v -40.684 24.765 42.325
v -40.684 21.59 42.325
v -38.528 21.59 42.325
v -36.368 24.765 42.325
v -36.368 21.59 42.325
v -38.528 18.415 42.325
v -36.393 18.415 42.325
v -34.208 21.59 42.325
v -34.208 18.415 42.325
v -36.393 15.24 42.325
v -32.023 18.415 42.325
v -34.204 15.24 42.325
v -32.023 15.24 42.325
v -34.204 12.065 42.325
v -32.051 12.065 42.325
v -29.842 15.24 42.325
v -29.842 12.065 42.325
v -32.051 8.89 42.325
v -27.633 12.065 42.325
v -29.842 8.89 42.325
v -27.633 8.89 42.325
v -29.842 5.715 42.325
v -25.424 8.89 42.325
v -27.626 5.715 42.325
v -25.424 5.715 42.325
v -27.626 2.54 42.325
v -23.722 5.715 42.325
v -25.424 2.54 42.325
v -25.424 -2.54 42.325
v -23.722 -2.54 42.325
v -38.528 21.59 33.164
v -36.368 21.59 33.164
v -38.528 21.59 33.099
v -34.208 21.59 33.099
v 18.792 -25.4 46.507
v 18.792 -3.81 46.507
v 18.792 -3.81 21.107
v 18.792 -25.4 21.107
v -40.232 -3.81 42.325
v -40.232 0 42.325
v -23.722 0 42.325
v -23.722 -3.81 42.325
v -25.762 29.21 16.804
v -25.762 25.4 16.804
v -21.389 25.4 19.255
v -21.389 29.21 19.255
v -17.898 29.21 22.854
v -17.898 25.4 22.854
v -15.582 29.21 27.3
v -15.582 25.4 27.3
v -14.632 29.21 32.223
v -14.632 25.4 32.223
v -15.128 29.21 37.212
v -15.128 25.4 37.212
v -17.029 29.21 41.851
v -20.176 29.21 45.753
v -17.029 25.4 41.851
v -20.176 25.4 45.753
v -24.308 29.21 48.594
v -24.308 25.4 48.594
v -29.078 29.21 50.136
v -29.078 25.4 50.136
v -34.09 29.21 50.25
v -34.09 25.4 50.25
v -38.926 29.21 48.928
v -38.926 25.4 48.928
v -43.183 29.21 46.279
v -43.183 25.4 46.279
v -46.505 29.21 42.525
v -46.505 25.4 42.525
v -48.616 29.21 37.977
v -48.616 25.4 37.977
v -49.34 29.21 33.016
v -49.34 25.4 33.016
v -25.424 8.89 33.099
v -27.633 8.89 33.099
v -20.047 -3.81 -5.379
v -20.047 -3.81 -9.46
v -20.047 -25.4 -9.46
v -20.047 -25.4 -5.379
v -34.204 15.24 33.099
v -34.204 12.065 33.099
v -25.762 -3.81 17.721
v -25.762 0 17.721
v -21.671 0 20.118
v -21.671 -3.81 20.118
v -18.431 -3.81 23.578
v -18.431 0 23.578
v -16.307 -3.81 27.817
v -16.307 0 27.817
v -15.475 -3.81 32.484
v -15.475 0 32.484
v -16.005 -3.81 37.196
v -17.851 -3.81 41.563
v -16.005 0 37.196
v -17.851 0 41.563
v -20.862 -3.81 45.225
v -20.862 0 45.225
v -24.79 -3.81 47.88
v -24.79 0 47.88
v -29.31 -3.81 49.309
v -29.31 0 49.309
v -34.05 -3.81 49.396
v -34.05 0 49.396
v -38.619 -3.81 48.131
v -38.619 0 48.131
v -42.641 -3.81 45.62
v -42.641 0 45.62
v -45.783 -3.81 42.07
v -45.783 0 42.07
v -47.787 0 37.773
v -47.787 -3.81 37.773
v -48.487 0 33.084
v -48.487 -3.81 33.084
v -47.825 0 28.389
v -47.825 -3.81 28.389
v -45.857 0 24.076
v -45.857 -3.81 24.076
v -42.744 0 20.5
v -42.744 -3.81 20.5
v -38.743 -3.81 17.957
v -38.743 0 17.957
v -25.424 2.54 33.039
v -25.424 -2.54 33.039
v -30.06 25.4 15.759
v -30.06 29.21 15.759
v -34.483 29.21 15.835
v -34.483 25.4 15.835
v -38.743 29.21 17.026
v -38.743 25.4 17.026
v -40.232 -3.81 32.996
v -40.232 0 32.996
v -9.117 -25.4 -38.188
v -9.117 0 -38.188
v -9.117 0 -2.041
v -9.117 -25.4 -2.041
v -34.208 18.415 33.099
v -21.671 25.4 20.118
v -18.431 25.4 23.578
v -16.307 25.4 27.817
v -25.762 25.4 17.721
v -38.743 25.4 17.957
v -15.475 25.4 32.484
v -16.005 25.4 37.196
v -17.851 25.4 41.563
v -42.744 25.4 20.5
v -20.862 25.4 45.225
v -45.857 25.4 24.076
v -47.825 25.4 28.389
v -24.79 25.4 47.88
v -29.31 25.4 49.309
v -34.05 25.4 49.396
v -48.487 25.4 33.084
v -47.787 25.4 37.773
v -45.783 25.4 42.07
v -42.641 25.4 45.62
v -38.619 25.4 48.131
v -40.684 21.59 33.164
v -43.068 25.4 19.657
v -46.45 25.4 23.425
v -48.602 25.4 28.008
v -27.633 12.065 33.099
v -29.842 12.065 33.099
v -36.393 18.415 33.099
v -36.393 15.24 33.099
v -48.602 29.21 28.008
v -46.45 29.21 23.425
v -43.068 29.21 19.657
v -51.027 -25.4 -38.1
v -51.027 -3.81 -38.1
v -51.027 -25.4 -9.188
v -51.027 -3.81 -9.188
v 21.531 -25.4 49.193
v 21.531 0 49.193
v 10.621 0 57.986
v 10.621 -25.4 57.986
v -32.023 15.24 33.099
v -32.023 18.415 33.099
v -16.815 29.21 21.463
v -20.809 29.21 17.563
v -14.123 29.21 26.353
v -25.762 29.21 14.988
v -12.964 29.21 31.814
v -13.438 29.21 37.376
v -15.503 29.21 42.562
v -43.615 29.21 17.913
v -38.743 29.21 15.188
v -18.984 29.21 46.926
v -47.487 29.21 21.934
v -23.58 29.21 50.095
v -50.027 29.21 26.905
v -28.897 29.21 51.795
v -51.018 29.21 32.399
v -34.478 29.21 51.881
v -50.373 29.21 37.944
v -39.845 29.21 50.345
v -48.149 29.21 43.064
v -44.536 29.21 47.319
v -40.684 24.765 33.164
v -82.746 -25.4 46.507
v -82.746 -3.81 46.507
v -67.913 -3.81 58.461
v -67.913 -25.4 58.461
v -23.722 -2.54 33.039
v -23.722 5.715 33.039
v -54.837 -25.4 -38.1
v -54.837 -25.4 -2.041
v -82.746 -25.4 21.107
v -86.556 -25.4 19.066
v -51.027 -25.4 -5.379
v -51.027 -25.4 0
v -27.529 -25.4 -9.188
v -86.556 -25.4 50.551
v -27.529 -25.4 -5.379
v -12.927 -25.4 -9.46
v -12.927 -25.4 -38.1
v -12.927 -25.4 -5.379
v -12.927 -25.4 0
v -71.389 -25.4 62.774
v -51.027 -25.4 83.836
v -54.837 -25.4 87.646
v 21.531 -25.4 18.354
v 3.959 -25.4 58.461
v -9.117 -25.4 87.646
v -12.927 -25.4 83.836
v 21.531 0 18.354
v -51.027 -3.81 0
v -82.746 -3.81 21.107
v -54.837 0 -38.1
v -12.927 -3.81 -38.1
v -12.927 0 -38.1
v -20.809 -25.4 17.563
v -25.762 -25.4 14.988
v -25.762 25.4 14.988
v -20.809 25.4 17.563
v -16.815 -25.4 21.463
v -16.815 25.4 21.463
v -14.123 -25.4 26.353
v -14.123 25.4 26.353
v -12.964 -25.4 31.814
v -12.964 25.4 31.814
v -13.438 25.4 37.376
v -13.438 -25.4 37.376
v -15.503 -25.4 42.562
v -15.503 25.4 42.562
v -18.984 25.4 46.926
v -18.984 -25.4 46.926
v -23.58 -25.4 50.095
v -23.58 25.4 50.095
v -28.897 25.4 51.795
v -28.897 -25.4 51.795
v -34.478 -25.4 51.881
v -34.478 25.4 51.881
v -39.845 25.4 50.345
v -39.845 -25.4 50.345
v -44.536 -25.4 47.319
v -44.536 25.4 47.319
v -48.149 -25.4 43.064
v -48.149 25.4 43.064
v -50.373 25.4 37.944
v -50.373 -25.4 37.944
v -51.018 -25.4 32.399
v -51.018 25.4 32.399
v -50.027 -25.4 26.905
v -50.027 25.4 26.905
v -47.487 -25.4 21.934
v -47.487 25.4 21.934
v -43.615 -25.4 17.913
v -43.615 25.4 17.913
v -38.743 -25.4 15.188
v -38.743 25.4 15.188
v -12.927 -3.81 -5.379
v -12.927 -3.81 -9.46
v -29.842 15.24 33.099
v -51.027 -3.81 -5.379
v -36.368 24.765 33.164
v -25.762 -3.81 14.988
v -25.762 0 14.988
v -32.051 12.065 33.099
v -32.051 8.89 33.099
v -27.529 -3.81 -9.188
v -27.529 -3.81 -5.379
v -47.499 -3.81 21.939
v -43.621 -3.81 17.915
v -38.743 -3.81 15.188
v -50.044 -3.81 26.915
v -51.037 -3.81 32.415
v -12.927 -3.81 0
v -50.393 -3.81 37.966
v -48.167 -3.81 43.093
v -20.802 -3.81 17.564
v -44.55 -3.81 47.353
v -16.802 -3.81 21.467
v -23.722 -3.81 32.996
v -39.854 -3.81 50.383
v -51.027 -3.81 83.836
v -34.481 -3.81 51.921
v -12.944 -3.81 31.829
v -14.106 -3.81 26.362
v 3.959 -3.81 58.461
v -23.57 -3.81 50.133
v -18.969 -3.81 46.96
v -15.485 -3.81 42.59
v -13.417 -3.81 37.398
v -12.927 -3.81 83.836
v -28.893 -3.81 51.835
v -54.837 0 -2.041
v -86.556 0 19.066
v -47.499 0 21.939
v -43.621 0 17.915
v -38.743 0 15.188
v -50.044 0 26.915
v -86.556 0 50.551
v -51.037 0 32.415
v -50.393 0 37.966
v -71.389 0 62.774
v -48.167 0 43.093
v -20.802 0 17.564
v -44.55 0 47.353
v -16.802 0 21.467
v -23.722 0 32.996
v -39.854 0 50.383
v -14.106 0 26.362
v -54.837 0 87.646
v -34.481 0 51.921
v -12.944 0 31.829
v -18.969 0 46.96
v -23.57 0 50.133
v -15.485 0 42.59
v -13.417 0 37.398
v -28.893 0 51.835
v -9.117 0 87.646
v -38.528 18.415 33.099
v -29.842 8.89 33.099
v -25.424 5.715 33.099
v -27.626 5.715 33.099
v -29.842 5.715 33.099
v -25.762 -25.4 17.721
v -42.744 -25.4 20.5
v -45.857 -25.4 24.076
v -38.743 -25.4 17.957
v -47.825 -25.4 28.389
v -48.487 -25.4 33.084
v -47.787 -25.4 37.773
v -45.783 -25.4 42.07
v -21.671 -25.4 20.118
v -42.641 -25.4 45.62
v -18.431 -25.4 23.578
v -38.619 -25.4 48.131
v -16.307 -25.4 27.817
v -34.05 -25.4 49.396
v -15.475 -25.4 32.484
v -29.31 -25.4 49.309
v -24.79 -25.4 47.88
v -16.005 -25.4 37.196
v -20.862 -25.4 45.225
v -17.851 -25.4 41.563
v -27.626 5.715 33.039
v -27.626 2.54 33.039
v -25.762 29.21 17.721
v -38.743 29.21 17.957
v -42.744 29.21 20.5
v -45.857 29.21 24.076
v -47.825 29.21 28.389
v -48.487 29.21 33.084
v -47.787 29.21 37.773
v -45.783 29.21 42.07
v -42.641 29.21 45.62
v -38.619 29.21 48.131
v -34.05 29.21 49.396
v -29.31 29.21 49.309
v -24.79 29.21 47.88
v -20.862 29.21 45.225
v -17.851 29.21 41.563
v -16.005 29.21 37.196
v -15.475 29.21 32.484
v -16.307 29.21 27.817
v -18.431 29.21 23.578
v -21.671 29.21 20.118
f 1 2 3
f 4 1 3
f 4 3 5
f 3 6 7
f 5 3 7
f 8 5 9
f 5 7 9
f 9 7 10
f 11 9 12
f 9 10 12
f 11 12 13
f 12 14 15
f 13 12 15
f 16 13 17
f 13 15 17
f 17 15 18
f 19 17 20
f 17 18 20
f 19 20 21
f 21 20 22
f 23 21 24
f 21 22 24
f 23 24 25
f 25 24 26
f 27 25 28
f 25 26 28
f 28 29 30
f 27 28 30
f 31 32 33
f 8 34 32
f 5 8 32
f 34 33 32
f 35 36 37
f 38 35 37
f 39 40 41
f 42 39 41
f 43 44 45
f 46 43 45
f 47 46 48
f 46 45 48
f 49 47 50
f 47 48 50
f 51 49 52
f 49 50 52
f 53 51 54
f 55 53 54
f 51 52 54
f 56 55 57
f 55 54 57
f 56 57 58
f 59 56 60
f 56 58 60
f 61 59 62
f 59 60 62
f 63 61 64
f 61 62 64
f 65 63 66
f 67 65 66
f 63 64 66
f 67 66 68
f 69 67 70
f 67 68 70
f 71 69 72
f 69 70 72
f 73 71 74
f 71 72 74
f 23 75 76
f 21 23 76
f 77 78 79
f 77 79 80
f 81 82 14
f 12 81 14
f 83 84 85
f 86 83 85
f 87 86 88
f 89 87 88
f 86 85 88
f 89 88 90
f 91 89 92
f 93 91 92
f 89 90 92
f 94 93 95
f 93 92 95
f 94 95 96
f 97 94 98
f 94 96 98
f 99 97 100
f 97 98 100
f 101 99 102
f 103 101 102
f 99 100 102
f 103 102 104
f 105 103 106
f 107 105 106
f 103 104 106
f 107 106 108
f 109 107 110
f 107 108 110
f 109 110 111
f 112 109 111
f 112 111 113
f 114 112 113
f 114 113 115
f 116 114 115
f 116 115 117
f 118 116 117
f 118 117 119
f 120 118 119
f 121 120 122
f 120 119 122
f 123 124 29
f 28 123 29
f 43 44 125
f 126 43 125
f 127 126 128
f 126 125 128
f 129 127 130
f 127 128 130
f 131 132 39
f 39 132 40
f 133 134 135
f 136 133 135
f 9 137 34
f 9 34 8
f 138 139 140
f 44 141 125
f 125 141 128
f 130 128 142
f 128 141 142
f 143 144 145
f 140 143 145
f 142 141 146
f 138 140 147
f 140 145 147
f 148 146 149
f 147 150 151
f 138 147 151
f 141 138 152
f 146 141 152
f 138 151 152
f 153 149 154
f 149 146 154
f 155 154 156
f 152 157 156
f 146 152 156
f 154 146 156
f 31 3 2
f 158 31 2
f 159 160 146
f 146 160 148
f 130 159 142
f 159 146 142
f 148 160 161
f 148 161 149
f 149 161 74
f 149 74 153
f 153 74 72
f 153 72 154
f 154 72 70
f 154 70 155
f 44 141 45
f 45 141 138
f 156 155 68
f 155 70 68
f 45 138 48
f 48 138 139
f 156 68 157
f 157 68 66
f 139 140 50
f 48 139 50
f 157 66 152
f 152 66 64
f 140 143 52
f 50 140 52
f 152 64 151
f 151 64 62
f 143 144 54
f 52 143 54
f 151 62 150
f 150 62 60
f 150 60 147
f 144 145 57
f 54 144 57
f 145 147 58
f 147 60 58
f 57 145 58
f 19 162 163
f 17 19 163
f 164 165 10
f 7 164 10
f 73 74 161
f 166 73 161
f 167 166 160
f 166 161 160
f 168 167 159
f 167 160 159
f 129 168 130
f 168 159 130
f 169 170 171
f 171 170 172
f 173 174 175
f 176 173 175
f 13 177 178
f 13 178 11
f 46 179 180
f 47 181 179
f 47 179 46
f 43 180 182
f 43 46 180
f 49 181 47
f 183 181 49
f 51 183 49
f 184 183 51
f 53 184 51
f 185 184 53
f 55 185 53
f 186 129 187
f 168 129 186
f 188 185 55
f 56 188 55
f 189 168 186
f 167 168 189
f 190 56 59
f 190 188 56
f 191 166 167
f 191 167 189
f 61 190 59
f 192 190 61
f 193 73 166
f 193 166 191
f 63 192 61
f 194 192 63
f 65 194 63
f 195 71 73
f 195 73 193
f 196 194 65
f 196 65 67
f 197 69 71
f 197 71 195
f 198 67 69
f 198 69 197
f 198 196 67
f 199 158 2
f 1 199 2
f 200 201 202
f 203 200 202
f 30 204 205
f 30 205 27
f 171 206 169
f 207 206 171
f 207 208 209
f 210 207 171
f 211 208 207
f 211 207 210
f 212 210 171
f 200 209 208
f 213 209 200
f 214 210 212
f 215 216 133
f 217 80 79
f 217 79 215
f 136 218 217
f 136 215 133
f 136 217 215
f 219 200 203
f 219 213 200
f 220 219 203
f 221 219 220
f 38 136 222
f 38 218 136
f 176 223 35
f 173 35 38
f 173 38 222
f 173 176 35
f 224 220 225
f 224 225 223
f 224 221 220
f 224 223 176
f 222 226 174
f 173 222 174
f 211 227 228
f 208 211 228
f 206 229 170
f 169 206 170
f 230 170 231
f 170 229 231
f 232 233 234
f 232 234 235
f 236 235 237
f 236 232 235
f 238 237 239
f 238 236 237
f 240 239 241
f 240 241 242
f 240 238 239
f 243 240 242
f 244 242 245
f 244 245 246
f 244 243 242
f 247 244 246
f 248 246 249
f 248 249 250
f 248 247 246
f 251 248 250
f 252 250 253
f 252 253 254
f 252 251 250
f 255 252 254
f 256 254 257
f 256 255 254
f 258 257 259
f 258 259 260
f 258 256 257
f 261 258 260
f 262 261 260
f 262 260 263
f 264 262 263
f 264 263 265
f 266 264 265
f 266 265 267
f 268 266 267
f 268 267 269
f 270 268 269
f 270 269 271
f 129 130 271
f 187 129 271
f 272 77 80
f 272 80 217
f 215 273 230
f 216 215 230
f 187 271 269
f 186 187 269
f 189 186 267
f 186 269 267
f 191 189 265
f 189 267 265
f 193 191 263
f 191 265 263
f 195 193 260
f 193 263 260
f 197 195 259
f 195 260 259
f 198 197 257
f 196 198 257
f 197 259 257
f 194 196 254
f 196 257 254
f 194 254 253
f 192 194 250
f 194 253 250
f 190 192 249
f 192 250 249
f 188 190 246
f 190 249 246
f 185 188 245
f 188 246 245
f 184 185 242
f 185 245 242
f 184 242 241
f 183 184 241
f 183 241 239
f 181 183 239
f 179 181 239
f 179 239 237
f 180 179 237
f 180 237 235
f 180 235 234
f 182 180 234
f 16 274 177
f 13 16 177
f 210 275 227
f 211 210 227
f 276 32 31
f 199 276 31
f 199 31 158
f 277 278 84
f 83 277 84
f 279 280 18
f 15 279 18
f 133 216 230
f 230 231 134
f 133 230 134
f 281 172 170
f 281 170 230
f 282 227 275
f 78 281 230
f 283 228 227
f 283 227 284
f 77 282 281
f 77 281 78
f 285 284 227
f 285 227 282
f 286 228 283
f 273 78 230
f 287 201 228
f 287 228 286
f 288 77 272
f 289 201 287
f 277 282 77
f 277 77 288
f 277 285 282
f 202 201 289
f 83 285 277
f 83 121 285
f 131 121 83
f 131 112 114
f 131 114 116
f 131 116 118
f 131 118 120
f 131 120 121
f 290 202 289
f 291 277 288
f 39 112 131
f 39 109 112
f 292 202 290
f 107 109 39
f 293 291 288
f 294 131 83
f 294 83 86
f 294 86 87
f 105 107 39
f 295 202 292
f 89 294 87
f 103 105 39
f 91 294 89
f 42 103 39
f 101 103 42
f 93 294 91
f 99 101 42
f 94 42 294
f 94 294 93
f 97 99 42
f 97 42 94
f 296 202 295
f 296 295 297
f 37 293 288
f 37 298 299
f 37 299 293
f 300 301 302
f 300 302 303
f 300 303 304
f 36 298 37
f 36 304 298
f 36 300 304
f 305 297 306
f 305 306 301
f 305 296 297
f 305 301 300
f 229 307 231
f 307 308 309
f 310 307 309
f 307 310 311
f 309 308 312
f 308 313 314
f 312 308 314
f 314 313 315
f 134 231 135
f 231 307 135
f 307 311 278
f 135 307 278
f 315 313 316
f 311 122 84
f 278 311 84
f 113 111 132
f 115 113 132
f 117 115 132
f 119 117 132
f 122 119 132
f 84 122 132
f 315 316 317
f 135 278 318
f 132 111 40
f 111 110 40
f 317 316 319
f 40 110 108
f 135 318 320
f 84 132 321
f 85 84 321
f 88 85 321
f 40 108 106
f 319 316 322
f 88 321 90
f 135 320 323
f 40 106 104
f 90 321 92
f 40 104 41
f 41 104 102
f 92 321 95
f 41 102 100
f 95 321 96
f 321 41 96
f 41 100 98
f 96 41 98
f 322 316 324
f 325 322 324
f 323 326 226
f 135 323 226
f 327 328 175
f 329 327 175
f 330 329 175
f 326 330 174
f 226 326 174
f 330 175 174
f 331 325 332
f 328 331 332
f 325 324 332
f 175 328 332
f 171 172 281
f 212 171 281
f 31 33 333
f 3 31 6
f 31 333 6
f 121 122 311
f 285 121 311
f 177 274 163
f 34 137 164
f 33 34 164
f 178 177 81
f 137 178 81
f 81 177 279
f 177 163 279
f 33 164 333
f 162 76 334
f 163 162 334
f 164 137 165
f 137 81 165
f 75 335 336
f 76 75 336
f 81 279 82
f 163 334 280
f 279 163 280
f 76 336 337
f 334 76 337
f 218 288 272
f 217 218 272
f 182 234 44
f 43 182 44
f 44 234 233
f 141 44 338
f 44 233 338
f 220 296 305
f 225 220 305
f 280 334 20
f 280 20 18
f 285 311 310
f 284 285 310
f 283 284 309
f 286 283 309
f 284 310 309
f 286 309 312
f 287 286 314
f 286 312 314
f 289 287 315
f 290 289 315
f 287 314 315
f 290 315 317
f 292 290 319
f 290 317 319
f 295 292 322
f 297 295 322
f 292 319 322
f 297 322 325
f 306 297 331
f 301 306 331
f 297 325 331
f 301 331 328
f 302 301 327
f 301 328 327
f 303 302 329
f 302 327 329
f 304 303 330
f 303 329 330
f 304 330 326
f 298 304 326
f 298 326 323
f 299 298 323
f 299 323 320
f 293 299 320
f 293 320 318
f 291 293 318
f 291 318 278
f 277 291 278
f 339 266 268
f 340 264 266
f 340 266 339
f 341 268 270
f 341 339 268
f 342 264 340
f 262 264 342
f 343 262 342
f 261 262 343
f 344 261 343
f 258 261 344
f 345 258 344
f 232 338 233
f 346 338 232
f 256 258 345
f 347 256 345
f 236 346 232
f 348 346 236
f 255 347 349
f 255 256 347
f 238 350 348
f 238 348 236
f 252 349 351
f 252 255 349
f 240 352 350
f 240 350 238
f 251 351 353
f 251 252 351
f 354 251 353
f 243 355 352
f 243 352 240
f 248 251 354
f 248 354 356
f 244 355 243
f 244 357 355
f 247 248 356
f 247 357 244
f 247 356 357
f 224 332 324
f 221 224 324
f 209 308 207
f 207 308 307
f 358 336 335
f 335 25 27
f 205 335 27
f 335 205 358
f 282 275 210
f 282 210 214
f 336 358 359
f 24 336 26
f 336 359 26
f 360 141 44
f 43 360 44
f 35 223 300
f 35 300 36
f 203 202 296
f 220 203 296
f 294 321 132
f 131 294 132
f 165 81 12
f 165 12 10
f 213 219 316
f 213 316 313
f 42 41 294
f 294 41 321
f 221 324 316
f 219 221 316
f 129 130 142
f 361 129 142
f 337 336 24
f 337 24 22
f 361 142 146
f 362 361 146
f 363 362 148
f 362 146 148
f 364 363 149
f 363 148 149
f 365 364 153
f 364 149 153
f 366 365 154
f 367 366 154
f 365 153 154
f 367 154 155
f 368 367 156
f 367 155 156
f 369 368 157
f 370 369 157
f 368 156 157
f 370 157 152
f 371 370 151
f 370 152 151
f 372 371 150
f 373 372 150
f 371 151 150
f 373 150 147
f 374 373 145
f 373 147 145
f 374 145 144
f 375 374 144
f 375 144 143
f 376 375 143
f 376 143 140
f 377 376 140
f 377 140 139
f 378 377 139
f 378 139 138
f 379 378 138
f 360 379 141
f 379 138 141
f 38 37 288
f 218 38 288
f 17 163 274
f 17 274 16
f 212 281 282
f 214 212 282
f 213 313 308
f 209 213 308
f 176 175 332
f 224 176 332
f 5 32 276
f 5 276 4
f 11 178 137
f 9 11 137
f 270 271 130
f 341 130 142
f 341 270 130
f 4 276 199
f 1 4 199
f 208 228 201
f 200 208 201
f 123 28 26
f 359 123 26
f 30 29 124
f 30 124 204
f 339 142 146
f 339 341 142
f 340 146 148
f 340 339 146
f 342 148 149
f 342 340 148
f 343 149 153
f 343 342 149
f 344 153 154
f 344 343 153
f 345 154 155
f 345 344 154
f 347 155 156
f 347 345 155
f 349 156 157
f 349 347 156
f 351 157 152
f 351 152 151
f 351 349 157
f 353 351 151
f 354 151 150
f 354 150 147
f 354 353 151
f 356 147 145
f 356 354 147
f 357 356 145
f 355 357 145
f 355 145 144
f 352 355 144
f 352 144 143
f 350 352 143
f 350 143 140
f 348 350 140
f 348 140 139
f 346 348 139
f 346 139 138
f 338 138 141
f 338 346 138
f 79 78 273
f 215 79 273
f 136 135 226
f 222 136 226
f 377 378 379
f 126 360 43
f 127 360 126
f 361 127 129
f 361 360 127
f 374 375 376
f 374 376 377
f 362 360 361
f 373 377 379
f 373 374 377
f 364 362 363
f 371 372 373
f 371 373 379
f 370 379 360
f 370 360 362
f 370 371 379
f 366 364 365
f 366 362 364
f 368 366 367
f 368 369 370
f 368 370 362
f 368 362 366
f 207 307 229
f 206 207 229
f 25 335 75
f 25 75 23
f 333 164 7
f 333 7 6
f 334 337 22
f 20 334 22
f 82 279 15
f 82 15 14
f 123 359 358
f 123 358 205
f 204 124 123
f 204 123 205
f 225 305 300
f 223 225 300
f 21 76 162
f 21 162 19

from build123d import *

# Parameters (mm, degrees)
F1_DEPTH  = 25.4
F2_DEPTH  = 25.4
F3_DEPTH  = 3.81
F5_W      = 23.4985564016
F5_H      = 3.8088811561
F5_W_2    = 7.119712124
F5_H_2    = 4.0809446946
F6_DEPTH  = 21.59
F7_W      = 1.7024531355
F7_H      = 9.2860683799
F8_DEPTH  = 2.54
F9_W      = 2.2018989548
F9_H      = 9.2860683799
F10_DEPTH = 3.175
F11_DEPTH = 3.175
F12_W     = 2.2159516811
F12_H     = 9.2260986567
F12_W_2   = 2.2018989548
F13_DEPTH = 3.175
F14_W     = 2.208925318
F14_H     = 9.2260986567
F14_W_2   = 2.2090896964
F15_DEPTH = 3.175
F16_W     = 2.1525025368
F16_H     = 9.2260986567
F16_W_2   = 2.2090075072
F17_DEPTH = 3.175
F18_W     = 2.180755022
F18_H     = 9.2260986567
F18_W_2   = 2.1889545023
F19_DEPTH = 3.175
F20_W     = 2.1348558366
F20_H     = 9.2260986567
F20_W_2   = 2.1848547622
F21_DEPTH = 3.175
F22_W     = 2.1598552994
F22_H     = 9.1612674296
F22_W_2   = 2.1560452878
F23_DEPTH = 3.175
F24_DEPTH = 3.81


with BuildPart() as f1:
    # F0 (on Front) → F1 (new body)
    with BuildSketch(Plane.XZ):
        Polygon((-71.3886133739, 62.7737028413), (-67.9131094975, 58.461044946), (-51.0271422677, 83.8361215117), (-54.8371422677, 87.6461215117), align=None)
        Polygon((-86.5559879748, 50.5505517126), (-82.7459879748, 46.5074590373), (-67.9131094975, 58.461044946), (-71.3886133739, 62.7737028413), align=None)
        Polygon((-86.5559879748, 19.0663513101), (-82.7459879748, 21.1074590373), (-82.7459879748, 46.5074590373), (-86.5559879748, 50.5505517126), align=None)
        Polygon((-54.8371422677, -2.0411077271), (-51.0271422677, 0), (-82.7459879748, 21.1074590373), (-86.5559879748, 19.0663513101), align=None)
        Polygon((-51.0271422677, -9.4391499932), (-51.0271422677, 0), (-54.8371422677, -2.0411077271), (-54.8371422677, -38.1), (-51.0271422677, -38.1), align=None)
        Polygon((-54.8371422677, 87.6461215117), (-51.0271422677, 83.8361215117), (-12.9271422677, 83.8361215117), (-9.1171422677, 87.6461215117), align=None)
        Polygon((-9.1171422677, 87.6461215117), (-12.9271422677, 83.8361215117), (3.9588249621, 58.461044946), (10.6205295243, 57.9856983845), align=None)
        Polygon((10.6205295243, 57.9856983845), (3.9588249621, 58.461044946), (18.7917034394, 46.5074590373), (21.5305625329, 49.1934725845), align=None)
        Polygon((18.7917034394, 46.5074590373), (18.7917034394, 21.1074590373), (21.5305625329, 18.3535554217), (21.5305625329, 49.1934725845), align=None)
        Polygon((18.7917034394, 21.1074590373), (-12.9271422677, 0), (-9.1171422677, -2.0411077271), (21.5305625329, 18.3535554217), align=None)
        Polygon((-12.9271422677, -9.4391499932), (-12.9271422677, -38.1), (-9.1171422677, -38.1877794862), (-9.1171422677, -2.0411077271), (-12.9271422677, 0), align=None)
    extrude(amount=F1_DEPTH)

    # F0 (on Front) → F3 (join)
    with BuildSketch(Plane.XZ):
        Polygon((-82.7459879748, 21.1074590373), (-51.0271422677, 0), (-51.0271422677, -9.4391499932), (-51.0271422677, -38.1), (-12.9271422677, -38.1), (-12.9271422677, -9.4391499932), (-12.9271422677, 0), (18.7917034394, 21.1074590373), (18.7917034394, 46.5074590373), (3.9588249621, 58.461044946), (-12.9271422677, 83.8361215117), (-51.0271422677, 83.8361215117), (-67.9131094975, 58.461044946), (-82.7459879748, 46.5074590373), align=None)
        with BuildLine():
            ThreePointArc((-38.7432127325, 15.1876261035), (-31.6836311373, 52.0835575626), (-25.7617975071, 14.988014205))
            Line((-25.7617975071, 14.988014205), (-25.7617975071, 17.7207682707))
            ThreePointArc((-25.7617975071, 17.7207682707), (-31.676990567, 49.5235857889), (-38.7432127325, 17.9565584449))
            Line((-38.7432127325, 17.9565584449), (-38.7432127325, 15.1876261035))
        make_face(mode=Mode.SUBTRACT)
        Polygon((-23.7218233431, 32.9955678842), (-31.9771422677, 32.9955678842), (-40.2319762915, 32.9955678842), (-40.2319762915, 42.3252284527), (-23.7218233431, 42.3252284527), (-23.7218233431, 33.0163085965), align=None, mode=Mode.SUBTRACT)
    extrude(amount=F3_DEPTH)

    # F5 (on face) → F6 (join)
    with BuildSketch(Plane.XZ.offset(3.81)):
        with Locations((-39.2778640669, -7.2833341546)):
            Rectangle(F5_W, F5_H)
        with Locations((-16.4869983297, -7.4193659239)):
            Rectangle(F5_W_2, F5_H_2)
    extrude(amount=F6_DEPTH)


with BuildPart() as f2:
    # F0 (on Front) → F2 (new body, symmetric)
    with BuildSketch(Plane.XZ):
        with BuildLine():
            Line((-25.7617975071, 17.7207682707), (-25.7617975071, 14.988014205))
            ThreePointArc((-25.7617975071, 14.988014205), (-31.6842499191, 52.043316152), (-38.7432127325, 15.1876261035))
            Line((-38.7432127325, 15.1876261035), (-38.7432127325, 17.9565584449))
            ThreePointArc((-38.7432127325, 17.9565584449), (-31.676990567, 49.5235857889), (-25.7617975071, 17.7207682707))
        make_face()
    extrude(amount=F2_DEPTH, both=True)

    # F4 (on face) → F24, piece 2 (join)
    with BuildSketch(Plane(origin=(0, 25.4, 0), x_dir=(-1, 0, 0), z_dir=(0, 1, 0))):
        with BuildLine():
            ThreePointArc((25.7617975071, 16.8035637745), (22.1389603555, 47.3235128183), (49.3399924318, 33.0163085965))
            ThreePointArc((49.3399924318, 33.0163085965), (46.4503440601, 23.4248103372), (38.7432127325, 17.0258234433))
            Line((38.7432127325, 17.0258234433), (38.7432127325, 15.1876261035))
            ThreePointArc((38.7432127325, 15.1876261035), (31.6842499191, 52.043316152), (25.7617975071, 14.988014205))
            Line((25.7617975071, 14.988014205), (25.7617975071, 16.8035637745))
        make_face()
    extrude(amount=F24_DEPTH)


with BuildPart() as f8:
    # F7 (on face) → F8 (new body, symmetric)
    with BuildSketch(Plane.XZ):
        with Locations((-24.5730499108, 37.6821942627)):
            Rectangle(F7_W, F7_H)
    extrude(amount=F8_DEPTH, both=True)

    # F9 (on face) → F10 (join)
    with BuildSketch(Plane(origin=(0, 2.54, 0), x_dir=(-1, 0, 0), z_dir=(0, 1, 0))):
        with Locations((26.525225956, 37.6821942627)):
            Rectangle(F9_W, F9_H)
    extrude(amount=F10_DEPTH)

    # F11 (add): a face of the model
    f11_faces = [f8.faces().sort_by_distance(p)[0] for p in [
        (-24.5730499108, 2.54, 37.6821942627),
    ]]
    extrude(f11_faces, amount=F11_DEPTH)

    # F12 (on face) → F13 (join)
    with BuildSketch(Plane(origin=(0, 5.715, 0), x_dir=(-1, 0, 0), z_dir=(0, 1, 0))):
        with Locations((28.734151274, 37.7121791244)):
            Rectangle(F12_W, F12_H)
        with Locations((26.525225956, 37.7121791244)):
            Rectangle(F12_W_2, F12_H)
    extrude(amount=F13_DEPTH)

    # F14 (on face) → F15 (join)
    with BuildSketch(Plane(origin=(0, 8.89, 0), x_dir=(-1, 0, 0), z_dir=(0, 1, 0))):
        with Locations((28.7376644555, 37.7121791244)):
            Rectangle(F14_W, F14_H)
        with Locations((30.9466719627, 37.7121791244)):
            Rectangle(F14_W_2, F14_H)
    extrude(amount=F15_DEPTH)

    # F16 (on face) → F17 (join)
    with BuildSketch(Plane(origin=(0, 12.065, 0), x_dir=(-1, 0, 0), z_dir=(0, 1, 0))):
        with Locations((33.1274680793, 37.7121791244)):
            Rectangle(F16_W, F16_H)
        with Locations((30.9467130573, 37.7121791244)):
            Rectangle(F16_W_2, F16_H)
    extrude(amount=F17_DEPTH)

    # F18 (on face) → F19 (join)
    with BuildSketch(Plane(origin=(0, 15.24, 0), x_dir=(-1, 0, 0), z_dir=(0, 1, 0))):
        with Locations((33.1133418367, 37.7121791244)):
            Rectangle(F18_W, F18_H)
        with Locations((35.2981965989, 37.7121791244)):
            Rectangle(F18_W_2, F18_H)
    extrude(amount=F19_DEPTH)

    # F20 (on face) → F21 (join)
    with BuildSketch(Plane(origin=(0, 18.415, 0), x_dir=(-1, 0, 0), z_dir=(0, 1, 0))):
        with Locations((37.4601017684, 37.7121791244)):
            Rectangle(F20_W, F20_H)
        with Locations((35.300246469, 37.7121791244)):
            Rectangle(F20_W_2, F20_H)
    extrude(amount=F21_DEPTH)

    # F22 (on face) → F23 (join)
    with BuildSketch(Plane(origin=(0, 21.59, 0), x_dir=(-1, 0, 0), z_dir=(0, 1, 0))):
        with Locations((37.447602037, 37.7445947379)):
            Rectangle(F22_W, F22_H)
        with Locations((39.6055523306, 37.7445947379)):
            Rectangle(F22_W_2, F22_H)
    extrude(amount=F23_DEPTH)


with BuildPart() as f24:
    # F4 (on face) → F24 (new body)
    with BuildSketch(Plane(origin=(0, 25.4, 0), x_dir=(-1, 0, 0), z_dir=(0, 1, 0))):
        with BuildLine():
            Line((25.7617975071, 17.7207682707), (25.7617975071, 16.8035637745))
            ThreePointArc((25.7617975071, 16.8035637745), (32.2740610966, 15.6556838807), (38.7432127325, 17.0258234433))
            Line((38.7432127325, 17.0258234433), (38.7432127325, 17.9565584449))
            ThreePointArc((38.7432127325, 17.9565584449), (31.676990567, 49.5235857889), (25.7617975071, 17.7207682707))
        make_face()
    extrude(amount=F24_DEPTH)


solid = Compound([f1.part, f2.part, f8.part, f24.part])
